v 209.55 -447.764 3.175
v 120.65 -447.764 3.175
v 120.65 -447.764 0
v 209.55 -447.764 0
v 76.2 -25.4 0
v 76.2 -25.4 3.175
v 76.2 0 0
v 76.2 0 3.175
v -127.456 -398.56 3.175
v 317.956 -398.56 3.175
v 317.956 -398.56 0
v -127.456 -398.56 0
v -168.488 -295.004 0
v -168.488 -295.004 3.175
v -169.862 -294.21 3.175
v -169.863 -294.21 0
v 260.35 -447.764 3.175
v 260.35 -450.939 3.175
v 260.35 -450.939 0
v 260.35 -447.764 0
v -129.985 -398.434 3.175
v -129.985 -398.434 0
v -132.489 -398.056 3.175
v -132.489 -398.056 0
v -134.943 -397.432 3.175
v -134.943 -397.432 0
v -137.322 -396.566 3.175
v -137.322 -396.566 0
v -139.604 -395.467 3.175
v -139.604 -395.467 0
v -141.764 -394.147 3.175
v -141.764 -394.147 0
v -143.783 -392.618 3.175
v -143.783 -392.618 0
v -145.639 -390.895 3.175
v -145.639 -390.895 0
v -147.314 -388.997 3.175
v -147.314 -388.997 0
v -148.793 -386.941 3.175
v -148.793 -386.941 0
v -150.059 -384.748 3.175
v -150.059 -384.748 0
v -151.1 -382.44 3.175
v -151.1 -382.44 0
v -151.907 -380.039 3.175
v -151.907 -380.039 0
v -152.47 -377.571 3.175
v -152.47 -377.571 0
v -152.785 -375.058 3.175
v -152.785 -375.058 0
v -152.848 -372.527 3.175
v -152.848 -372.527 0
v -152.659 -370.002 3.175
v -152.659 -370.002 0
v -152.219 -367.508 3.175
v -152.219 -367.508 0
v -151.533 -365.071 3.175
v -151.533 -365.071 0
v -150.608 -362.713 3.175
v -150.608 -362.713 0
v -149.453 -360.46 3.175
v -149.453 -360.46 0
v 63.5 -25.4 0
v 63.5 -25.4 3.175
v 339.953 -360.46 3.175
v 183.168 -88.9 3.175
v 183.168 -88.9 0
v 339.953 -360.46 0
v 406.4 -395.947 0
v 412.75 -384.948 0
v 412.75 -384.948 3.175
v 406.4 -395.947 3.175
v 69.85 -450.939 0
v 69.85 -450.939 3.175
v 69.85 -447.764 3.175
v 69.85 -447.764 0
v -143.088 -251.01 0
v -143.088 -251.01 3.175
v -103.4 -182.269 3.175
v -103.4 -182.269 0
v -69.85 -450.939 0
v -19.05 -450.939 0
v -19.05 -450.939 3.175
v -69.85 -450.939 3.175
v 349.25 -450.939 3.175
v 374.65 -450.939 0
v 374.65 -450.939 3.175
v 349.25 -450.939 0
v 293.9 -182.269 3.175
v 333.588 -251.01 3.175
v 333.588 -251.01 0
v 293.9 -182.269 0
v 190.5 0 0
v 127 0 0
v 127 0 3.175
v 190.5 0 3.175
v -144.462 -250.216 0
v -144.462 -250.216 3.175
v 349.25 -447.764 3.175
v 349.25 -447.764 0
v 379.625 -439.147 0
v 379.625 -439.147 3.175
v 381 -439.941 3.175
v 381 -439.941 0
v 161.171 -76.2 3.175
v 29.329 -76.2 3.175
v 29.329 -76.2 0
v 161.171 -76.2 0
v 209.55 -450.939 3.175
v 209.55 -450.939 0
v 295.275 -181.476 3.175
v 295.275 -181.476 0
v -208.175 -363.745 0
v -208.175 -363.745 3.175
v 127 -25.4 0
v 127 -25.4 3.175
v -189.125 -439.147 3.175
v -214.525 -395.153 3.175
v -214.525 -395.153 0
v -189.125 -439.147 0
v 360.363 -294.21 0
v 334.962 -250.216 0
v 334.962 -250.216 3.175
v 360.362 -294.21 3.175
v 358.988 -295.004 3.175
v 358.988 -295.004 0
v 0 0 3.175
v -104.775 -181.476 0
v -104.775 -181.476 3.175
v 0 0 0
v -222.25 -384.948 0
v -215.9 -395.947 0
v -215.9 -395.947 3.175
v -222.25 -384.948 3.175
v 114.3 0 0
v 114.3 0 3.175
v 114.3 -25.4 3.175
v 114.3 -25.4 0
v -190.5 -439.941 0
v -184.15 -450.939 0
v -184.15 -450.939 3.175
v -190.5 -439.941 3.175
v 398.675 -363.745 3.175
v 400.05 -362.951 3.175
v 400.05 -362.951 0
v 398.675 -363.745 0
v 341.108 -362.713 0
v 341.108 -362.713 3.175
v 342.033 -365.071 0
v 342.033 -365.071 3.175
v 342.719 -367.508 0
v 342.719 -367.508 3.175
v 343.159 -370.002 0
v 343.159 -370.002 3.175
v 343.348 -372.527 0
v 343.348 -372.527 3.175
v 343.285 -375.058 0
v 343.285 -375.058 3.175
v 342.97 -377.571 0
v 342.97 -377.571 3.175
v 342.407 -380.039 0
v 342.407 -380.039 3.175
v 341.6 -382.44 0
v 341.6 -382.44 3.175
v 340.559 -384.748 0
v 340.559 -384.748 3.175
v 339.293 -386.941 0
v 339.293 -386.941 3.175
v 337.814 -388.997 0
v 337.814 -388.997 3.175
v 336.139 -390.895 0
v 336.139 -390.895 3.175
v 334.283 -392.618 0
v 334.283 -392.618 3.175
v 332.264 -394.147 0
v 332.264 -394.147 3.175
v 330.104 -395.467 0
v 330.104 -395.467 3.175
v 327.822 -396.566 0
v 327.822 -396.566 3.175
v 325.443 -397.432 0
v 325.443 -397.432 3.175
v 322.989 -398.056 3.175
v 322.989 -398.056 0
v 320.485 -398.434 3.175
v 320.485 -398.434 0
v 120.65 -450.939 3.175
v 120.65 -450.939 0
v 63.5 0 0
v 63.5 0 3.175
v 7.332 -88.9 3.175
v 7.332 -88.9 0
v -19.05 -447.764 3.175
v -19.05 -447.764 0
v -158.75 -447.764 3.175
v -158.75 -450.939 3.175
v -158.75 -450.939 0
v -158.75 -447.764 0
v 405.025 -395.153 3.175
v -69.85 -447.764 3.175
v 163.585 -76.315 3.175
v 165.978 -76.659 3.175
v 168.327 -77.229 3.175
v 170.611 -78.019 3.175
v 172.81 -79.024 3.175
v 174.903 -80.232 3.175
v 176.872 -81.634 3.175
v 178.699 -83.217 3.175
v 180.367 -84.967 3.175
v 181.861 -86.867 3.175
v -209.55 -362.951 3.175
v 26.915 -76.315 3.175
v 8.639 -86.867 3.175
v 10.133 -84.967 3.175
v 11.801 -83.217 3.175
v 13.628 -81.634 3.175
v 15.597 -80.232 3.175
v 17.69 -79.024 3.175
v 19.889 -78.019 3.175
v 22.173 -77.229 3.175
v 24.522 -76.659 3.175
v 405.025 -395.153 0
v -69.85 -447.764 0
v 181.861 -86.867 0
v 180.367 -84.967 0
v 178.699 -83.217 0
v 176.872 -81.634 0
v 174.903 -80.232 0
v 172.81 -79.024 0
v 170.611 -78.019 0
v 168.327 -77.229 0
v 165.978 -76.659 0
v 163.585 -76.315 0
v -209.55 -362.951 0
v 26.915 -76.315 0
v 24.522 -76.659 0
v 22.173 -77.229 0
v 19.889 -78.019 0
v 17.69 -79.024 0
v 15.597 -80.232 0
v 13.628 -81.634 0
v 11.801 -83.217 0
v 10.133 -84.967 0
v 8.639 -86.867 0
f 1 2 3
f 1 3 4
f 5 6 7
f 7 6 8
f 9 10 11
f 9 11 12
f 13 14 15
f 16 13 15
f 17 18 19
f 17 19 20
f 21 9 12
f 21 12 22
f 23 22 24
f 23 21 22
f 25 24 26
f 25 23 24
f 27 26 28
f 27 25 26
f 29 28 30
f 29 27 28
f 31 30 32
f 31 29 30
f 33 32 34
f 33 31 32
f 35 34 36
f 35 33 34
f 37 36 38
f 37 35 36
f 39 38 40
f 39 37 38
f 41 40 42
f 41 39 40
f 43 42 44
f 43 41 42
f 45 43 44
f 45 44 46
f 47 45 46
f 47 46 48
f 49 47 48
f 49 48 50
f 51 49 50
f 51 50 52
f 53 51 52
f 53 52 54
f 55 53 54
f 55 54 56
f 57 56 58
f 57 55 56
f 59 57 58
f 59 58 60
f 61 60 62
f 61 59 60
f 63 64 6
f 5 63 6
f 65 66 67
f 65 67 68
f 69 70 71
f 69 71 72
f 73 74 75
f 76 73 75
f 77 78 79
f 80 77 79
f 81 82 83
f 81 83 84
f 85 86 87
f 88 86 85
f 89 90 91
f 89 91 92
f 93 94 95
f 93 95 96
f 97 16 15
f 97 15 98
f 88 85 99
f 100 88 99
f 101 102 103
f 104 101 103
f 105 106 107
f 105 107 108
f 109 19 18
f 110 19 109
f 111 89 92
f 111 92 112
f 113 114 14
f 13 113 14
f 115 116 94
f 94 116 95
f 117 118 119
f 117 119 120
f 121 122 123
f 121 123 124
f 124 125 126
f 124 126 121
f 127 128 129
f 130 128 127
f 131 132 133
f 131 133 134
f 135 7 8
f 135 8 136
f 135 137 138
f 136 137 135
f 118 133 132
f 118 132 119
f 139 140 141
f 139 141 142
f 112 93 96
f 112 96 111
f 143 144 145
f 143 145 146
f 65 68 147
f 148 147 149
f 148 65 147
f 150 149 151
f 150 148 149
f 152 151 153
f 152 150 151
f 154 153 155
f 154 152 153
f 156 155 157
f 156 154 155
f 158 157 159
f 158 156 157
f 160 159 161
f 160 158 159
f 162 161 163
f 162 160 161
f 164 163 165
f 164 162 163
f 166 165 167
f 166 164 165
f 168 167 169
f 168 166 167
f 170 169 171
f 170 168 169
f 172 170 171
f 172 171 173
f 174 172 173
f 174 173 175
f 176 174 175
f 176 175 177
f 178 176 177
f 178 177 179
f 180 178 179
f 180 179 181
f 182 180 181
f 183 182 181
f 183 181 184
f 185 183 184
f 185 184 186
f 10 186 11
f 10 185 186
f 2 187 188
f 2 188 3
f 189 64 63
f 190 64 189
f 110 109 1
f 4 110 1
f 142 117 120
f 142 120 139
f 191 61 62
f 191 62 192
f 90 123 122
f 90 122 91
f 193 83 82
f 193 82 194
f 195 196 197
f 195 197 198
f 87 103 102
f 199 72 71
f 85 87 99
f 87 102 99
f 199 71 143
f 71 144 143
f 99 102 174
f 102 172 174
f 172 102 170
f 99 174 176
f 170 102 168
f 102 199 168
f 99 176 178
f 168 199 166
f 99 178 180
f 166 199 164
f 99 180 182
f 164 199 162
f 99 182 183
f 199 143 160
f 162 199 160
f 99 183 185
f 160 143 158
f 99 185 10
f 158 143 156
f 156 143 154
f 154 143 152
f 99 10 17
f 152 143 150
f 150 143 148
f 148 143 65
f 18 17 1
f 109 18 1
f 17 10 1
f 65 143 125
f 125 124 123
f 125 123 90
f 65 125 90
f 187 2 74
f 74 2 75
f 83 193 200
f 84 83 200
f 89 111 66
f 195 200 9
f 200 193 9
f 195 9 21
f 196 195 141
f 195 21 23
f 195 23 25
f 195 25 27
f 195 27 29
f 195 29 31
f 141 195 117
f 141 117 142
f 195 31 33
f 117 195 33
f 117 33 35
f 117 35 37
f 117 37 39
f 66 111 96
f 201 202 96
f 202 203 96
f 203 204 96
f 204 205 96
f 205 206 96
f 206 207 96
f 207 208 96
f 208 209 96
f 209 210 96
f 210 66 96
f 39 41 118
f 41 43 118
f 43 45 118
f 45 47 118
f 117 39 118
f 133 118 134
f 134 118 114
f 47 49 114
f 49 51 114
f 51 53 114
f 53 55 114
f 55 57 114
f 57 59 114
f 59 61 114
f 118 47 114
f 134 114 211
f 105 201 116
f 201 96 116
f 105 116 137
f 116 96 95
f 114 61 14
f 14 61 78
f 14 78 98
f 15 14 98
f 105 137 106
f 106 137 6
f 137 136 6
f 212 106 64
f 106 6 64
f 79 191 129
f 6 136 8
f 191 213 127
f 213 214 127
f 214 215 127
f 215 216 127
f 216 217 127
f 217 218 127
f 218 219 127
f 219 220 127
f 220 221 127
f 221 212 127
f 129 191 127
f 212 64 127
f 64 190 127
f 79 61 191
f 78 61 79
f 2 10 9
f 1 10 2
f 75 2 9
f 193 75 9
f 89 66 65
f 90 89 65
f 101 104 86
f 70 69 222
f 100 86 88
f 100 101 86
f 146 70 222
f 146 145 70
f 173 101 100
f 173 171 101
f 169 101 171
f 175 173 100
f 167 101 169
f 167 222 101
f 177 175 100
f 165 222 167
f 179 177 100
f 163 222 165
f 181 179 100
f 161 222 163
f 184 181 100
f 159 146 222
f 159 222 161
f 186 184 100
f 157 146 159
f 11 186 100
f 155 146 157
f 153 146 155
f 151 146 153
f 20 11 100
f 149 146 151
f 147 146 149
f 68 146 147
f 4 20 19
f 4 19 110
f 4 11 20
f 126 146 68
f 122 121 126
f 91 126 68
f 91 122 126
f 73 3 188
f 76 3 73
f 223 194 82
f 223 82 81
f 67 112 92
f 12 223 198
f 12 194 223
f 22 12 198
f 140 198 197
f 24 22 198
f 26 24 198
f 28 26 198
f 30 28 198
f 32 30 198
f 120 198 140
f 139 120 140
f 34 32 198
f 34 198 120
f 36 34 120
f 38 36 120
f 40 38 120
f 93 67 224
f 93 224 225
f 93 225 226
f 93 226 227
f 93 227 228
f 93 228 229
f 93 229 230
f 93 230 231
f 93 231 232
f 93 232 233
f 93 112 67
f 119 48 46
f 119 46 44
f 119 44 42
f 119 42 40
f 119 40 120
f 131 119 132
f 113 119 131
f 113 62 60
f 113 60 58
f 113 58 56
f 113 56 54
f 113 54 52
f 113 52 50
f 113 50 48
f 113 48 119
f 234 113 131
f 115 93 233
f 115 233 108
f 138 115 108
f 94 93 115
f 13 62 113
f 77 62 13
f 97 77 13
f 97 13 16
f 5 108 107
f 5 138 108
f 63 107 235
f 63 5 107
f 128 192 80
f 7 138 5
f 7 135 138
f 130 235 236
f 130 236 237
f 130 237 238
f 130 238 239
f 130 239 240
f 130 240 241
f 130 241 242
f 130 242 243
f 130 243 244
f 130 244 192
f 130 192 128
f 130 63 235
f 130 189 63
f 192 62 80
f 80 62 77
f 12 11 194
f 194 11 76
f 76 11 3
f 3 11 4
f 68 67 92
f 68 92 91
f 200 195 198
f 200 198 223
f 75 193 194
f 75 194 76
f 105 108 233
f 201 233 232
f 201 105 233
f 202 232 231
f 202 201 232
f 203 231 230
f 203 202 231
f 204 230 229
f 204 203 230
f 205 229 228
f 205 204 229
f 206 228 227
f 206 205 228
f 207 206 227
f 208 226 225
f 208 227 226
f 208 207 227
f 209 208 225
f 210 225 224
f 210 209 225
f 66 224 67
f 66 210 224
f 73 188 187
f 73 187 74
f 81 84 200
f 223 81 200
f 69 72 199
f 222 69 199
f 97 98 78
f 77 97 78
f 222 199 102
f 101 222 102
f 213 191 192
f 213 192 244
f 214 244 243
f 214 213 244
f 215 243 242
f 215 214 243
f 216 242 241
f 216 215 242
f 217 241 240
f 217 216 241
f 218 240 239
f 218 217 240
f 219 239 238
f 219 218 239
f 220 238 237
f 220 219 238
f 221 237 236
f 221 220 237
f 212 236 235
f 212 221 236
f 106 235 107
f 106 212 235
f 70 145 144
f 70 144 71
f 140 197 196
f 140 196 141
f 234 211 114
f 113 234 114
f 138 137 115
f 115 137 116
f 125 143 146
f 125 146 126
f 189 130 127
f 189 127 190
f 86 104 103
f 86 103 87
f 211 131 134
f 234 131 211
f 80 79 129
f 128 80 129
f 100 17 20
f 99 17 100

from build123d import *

# Parameters (mm, degrees)
BOSS_EXTRUDE1_DEPTH = 3.175
SKETCH2_W           = 12.7
SKETCH2_H           = 25.4
CUT_EXTRUDE1_DEPTH  = 612.325617511
SKETCH4_W           = 88.9
SKETCH4_H           = 3.175
CUT_EXTRUDE2_DEPTH  = 612.325617511
CUT_EXTRUDE3_DEPTH  = 612.325617511


with BuildPart() as part:
    # Sketch1 → Boss-Extrude1 (new body)
    with BuildSketch(Plane.XY):
        Polygon((0, 0), (190.5, 0), (412.75, -384.948291982), (374.65, -450.939427751), (-184.15, -450.939427751), (-222.25, -384.948291982), align=None)
    extrude(amount=BOSS_EXTRUDE1_DEPTH)

    # Sketch2 → Cut-Extrude1 (cut, through all)
    with BuildSketch(Plane.XY.offset(3.175)):
        with Locations((69.85, -12.7)):
            Rectangle(SKETCH2_W, SKETCH2_H)
        with BuildLine():
            Line((29.329393675, -76.2), (161.170606325, -76.2))
            ThreePointArc((161.170606325, -76.2), (173.870606325, -79.602954744), (183.167651581, -88.9))
            Line((183.167651581, -88.9), (339.952954744, -360.460110958))
            ThreePointArc((339.952954744, -360.460110958), (339.952954744, -385.860110958), (317.955909488, -398.560110958))
            Line((317.955909488, -398.560110958), (-127.455909488, -398.560110958))
            ThreePointArc((-127.455909488, -398.560110958), (-149.452954744, -385.860110958), (-149.452954744, -360.460110958))
            Line((-149.452954744, -360.460110958), (7.332348419, -88.9))
            ThreePointArc((7.332348419, -88.9), (16.629393675, -79.602954744), (29.329393675, -76.2))
        make_face()
        with Locations((120.65, -12.7)):
            Rectangle(SKETCH2_W, SKETCH2_H)
    extrude(amount=-CUT_EXTRUDE1_DEPTH, mode=Mode.SUBTRACT)

    # Sketch4 → Cut-Extrude2 (cut, through all)
    with BuildSketch(Plane.XY.offset(3.175)):
        with Locations((-114.3, -449.351927751)):
            Rectangle(SKETCH4_W, SKETCH4_H)
        with Locations((25.4, -449.351927751)):
            Rectangle(SKETCH4_W, SKETCH4_H)
        with Locations((165.1, -449.351927751)):
            Rectangle(SKETCH4_W, SKETCH4_H)
        with Locations((304.8, -449.351927751)):
            Rectangle(SKETCH4_W, SKETCH4_H)
        Polygon((-215.9, -395.94681461), (-214.525184671, -395.15306461), (-189.125184671, -439.147155122), (-190.5, -439.940905122), align=None)
        Polygon((406.4, -395.94681461), (405.025184671, -395.15306461), (379.625184671, -439.147155122), (381, -439.940905122), align=None)
    extrude(amount=-CUT_EXTRUDE2_DEPTH, mode=Mode.SUBTRACT)

    # Sketch5 → Cut-Extrude3 (cut, through all)
    with BuildSketch(Plane.XY.offset(3.175)):
        Polygon((-209.55, -362.951246726), (-208.175184671, -363.744996726), (-168.487684671, -295.004230301), (-169.8625, -294.210480301), align=None)
        Polygon((-143.087684671, -251.010139788), (-103.400184671, -182.269373363), (-104.775, -181.475623363), (-144.4625, -250.216389788), align=None)
        Polygon((400.05, -362.951246726), (398.675184671, -363.744996726), (358.987684671, -295.004230301), (360.3625, -294.210480301), align=None)
        Polygon((334.9625, -250.216389788), (333.587684671, -251.010139788), (293.900184671, -182.269373363), (295.275, -181.475623363), align=None)
    extrude(amount=-CUT_EXTRUDE3_DEPTH, mode=Mode.SUBTRACT)


solid = part.part
